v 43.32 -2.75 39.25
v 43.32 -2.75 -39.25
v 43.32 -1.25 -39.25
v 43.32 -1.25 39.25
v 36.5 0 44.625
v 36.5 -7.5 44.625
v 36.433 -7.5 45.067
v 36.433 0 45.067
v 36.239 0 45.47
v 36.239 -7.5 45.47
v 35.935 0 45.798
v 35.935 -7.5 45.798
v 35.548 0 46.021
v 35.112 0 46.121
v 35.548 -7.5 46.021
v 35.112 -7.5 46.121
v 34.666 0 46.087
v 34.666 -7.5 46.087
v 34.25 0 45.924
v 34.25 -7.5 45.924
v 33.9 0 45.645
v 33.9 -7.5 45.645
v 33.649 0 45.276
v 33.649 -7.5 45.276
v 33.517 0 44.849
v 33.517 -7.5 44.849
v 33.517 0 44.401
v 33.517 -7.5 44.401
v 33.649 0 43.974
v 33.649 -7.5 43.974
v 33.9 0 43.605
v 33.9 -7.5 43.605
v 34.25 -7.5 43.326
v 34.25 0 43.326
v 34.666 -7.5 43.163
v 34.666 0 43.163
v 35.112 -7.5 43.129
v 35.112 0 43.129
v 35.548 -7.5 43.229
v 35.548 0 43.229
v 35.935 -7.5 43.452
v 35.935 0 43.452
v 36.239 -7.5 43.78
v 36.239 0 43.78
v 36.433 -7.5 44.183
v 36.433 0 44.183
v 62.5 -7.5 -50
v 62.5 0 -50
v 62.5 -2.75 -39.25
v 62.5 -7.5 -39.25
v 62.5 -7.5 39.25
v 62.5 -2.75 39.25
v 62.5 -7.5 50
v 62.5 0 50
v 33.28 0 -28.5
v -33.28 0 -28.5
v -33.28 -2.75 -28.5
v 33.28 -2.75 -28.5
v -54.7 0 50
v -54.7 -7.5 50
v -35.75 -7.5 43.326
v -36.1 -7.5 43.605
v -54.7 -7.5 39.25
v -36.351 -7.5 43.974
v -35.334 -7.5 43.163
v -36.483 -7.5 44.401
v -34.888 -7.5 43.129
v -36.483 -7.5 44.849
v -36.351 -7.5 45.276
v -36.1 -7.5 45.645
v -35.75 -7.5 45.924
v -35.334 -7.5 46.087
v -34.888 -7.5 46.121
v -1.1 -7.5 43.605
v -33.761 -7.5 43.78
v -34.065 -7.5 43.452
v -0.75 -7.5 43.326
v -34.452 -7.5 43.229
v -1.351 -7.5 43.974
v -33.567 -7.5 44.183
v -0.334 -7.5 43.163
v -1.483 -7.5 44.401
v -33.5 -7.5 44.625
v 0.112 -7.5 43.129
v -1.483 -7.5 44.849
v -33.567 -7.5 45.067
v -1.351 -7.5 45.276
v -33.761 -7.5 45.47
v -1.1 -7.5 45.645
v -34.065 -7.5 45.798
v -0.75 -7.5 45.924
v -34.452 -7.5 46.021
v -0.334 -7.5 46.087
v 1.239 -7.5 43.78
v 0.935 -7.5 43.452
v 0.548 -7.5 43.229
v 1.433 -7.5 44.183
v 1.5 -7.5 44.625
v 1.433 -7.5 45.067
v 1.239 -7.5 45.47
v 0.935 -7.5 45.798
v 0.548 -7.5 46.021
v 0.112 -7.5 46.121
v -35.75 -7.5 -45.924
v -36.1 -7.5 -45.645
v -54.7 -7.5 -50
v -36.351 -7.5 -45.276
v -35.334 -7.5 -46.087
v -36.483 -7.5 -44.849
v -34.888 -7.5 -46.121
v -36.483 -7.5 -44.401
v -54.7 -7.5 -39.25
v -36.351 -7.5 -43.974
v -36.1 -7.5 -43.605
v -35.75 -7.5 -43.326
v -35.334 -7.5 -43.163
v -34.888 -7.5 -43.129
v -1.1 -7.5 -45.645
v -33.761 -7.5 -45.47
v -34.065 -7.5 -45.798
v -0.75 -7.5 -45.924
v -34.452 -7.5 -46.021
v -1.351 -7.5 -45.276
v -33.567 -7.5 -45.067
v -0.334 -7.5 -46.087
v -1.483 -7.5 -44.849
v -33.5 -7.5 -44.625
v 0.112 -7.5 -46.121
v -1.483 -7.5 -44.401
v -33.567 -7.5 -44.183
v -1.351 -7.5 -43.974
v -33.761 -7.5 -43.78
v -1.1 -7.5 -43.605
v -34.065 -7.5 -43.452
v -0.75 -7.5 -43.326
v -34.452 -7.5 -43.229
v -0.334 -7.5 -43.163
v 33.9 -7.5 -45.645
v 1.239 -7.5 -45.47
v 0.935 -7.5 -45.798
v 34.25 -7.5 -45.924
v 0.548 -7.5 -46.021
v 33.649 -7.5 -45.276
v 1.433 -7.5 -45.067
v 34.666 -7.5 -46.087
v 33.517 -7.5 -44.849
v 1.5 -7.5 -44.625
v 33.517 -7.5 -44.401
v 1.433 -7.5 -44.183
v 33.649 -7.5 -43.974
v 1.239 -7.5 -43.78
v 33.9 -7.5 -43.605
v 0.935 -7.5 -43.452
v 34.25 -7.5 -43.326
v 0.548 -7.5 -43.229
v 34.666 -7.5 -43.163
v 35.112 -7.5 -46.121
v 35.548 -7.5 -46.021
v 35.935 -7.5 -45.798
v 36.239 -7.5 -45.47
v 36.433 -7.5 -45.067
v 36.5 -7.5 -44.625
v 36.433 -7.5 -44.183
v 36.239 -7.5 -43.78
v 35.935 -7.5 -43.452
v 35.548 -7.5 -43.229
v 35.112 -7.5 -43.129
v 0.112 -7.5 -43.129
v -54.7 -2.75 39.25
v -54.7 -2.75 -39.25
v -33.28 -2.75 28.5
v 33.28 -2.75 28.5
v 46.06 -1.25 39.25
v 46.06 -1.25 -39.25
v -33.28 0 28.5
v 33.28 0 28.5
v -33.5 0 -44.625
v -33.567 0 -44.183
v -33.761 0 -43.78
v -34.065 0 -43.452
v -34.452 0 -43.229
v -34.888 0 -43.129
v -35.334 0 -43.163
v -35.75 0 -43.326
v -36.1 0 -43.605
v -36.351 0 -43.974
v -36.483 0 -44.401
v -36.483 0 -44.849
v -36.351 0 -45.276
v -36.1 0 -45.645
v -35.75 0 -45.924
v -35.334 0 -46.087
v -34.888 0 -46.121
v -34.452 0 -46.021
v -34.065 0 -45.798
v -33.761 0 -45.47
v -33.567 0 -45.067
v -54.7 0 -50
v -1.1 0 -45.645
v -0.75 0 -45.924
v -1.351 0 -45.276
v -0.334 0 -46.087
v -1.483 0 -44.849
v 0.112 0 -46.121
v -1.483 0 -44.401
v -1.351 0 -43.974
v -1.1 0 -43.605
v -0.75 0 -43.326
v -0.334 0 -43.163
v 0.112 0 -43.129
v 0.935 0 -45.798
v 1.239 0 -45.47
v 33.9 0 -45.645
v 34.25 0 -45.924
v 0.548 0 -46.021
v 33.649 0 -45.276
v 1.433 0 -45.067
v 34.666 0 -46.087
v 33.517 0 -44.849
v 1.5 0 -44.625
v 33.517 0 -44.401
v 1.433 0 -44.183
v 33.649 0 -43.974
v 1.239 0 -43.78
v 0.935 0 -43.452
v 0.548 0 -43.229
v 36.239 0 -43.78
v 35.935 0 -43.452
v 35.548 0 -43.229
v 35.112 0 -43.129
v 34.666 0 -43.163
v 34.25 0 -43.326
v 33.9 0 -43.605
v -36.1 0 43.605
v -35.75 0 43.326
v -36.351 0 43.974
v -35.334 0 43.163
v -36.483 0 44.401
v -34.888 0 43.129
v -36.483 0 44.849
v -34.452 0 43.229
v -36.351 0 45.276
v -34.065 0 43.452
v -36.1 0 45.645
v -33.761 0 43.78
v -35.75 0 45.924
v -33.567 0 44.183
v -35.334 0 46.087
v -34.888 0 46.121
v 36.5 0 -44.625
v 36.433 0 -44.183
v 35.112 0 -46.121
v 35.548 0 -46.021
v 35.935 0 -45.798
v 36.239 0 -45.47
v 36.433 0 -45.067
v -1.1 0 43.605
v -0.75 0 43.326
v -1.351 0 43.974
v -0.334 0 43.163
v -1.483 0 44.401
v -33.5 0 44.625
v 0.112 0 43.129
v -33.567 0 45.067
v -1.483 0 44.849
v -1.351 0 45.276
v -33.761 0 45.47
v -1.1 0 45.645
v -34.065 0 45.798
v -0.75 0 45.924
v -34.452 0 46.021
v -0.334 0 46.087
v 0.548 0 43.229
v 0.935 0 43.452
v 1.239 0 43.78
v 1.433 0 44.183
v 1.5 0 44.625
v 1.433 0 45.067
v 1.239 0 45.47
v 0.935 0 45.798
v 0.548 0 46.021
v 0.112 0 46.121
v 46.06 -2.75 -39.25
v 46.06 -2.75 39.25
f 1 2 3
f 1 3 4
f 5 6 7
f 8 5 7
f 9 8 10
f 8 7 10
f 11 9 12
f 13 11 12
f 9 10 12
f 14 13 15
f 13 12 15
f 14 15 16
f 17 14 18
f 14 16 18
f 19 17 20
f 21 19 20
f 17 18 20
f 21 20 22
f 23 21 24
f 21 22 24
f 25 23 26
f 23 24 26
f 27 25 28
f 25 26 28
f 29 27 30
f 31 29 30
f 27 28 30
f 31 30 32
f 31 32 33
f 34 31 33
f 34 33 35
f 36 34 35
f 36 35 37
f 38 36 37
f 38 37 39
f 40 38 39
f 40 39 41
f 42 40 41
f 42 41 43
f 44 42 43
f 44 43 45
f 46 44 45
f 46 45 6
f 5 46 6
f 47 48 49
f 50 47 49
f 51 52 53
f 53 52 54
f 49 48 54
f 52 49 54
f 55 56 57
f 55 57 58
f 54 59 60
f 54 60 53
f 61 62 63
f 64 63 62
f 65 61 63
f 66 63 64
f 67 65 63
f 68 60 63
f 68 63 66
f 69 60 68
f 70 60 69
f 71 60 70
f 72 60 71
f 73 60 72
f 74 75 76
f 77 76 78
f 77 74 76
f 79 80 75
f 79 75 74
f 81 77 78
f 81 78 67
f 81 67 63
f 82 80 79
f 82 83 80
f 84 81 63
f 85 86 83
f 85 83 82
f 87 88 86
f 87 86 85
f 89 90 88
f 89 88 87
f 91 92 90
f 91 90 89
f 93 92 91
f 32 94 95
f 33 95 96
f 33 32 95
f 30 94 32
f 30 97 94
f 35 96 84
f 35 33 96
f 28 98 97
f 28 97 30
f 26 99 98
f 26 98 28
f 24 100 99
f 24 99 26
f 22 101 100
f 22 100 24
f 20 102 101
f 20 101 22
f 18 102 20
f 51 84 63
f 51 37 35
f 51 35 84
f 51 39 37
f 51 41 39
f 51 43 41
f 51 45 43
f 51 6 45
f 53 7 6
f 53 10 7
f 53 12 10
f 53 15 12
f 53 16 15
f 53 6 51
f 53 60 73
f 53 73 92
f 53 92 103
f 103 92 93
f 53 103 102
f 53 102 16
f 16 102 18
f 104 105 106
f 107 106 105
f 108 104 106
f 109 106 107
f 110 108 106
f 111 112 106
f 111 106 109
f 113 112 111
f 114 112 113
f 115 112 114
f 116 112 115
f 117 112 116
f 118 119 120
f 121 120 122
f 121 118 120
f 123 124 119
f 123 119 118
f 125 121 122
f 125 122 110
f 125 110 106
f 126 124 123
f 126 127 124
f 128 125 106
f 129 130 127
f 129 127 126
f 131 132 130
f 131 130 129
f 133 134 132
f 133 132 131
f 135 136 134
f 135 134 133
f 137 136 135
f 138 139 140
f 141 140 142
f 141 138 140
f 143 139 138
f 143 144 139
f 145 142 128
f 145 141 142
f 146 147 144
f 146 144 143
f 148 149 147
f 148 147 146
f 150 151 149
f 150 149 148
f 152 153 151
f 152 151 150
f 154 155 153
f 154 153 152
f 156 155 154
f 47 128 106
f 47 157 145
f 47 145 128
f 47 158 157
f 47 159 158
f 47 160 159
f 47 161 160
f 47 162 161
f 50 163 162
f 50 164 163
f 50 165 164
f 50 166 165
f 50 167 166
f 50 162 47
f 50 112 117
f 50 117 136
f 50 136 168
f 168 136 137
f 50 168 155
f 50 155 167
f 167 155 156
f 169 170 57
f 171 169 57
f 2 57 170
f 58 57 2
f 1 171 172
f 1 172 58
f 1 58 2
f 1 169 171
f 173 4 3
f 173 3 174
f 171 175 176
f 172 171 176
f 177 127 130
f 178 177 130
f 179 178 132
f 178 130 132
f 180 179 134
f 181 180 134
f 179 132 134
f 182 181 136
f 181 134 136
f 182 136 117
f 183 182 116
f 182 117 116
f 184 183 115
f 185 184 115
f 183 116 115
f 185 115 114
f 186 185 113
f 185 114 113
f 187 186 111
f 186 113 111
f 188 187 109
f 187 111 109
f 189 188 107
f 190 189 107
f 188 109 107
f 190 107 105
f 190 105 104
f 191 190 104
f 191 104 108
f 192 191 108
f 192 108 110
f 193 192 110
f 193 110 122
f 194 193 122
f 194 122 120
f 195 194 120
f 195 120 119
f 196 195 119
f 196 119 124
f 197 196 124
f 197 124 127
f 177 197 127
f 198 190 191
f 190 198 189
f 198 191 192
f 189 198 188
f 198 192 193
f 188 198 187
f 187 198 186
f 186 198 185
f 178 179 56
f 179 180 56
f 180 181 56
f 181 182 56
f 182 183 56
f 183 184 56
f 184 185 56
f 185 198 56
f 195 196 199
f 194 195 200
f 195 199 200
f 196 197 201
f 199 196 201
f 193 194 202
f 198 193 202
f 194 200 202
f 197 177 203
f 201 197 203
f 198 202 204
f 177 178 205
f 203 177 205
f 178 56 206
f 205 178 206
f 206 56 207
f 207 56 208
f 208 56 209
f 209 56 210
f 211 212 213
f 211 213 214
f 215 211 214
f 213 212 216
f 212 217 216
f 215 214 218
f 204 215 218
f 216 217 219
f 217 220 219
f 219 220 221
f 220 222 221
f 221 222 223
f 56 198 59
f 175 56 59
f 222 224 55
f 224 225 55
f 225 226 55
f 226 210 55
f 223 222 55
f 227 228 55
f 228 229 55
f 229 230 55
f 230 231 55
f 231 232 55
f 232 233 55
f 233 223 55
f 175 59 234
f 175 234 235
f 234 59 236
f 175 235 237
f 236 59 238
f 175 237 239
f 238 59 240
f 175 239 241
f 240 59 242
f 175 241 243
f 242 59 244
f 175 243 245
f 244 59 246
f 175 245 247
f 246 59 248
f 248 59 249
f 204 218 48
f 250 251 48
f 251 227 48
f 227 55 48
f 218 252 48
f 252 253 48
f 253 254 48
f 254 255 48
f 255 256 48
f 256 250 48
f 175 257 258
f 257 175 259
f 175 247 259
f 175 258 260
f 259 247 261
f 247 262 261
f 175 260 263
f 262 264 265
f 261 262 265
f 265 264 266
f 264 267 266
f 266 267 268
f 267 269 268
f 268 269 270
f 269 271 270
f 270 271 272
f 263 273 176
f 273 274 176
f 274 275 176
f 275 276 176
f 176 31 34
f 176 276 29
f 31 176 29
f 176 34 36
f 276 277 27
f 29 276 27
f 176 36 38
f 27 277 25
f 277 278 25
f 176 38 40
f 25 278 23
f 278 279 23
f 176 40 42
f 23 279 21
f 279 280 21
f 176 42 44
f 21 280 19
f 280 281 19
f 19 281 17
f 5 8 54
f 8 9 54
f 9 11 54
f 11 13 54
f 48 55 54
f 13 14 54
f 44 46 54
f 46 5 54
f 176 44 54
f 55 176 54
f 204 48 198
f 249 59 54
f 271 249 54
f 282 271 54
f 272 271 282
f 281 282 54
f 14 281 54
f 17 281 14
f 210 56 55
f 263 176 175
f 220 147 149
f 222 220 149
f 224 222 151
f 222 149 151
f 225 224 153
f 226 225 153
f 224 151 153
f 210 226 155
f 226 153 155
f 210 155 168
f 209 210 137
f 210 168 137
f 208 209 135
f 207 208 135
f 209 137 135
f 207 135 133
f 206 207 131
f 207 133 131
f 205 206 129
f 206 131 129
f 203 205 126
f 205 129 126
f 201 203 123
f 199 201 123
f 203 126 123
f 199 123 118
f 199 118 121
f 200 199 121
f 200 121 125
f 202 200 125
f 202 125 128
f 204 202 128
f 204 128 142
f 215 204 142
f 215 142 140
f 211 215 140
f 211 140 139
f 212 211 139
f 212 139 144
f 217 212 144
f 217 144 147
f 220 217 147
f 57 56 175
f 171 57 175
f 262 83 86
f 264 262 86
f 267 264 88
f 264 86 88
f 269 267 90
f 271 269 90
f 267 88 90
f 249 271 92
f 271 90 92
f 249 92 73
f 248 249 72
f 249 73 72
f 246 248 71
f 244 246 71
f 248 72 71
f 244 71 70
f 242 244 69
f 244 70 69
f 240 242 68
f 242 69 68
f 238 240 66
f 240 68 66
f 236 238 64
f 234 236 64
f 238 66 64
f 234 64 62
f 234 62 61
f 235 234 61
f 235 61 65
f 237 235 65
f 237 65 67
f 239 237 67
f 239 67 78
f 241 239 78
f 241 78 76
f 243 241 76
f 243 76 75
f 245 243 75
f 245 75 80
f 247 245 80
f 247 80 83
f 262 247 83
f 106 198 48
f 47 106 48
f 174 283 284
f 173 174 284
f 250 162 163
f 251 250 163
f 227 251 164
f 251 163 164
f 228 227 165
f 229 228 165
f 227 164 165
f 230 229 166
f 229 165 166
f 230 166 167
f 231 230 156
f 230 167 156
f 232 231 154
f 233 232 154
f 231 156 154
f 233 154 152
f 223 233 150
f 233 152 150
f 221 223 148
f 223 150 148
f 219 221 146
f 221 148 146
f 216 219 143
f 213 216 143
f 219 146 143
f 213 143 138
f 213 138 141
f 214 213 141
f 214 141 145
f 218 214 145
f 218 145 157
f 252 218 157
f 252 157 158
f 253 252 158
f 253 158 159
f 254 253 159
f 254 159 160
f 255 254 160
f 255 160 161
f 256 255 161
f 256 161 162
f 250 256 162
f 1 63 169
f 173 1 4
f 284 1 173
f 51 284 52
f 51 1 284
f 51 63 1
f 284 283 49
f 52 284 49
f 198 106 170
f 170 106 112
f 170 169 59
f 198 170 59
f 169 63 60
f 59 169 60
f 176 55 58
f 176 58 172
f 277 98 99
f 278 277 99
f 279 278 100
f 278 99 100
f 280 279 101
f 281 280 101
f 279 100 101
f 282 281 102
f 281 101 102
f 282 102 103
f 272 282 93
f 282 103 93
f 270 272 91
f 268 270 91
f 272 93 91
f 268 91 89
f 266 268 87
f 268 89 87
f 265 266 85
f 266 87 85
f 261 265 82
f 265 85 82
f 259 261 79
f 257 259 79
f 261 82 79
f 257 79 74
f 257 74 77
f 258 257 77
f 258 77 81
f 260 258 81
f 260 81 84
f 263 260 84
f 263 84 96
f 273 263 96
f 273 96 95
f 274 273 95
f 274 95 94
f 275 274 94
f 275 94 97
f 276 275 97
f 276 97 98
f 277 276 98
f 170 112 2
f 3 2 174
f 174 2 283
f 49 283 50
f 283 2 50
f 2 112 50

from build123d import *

# Parameters (mm, degrees)
F0_W      = 125
F0_H      = 100
F0_W_2    = 66.56
F0_H_2    = 57
F1_DEPTH  = 7.5
F2_W      = 174.649224
F2_H      = 78.5
F3_DEPTH  = 4.75
F4_W      = 2.74
F4_H      = 78.5
F5_DEPTH  = 1.5
F6_W      = 7.8
F6_H      = 78.5
F7_DEPTH  = 4.75
F8_W      = 7.8
F8_H      = 100
F9_DEPTH  = 25
F10_R     = 1.5
F11_DEPTH = 25
F12_R     = 1.5
F13_DEPTH = 25


with BuildPart() as f1:
    # F0 (on Front) → F1 (new body)
    with BuildSketch(Plane.XZ):
        Rectangle(F0_W, F0_H)
        Rectangle(F0_W_2, F0_H_2, mode=Mode.SUBTRACT)
    extrude(amount=F1_DEPTH)

    # F2 (on face) → F3 (cut)
    with BuildSketch(Plane.XZ.offset(7.5)):
        Rectangle(F2_W, F2_H)
    extrude(amount=-F3_DEPTH, mode=Mode.SUBTRACT)

    # F4 (on face) → F5 (cut)
    with BuildSketch(Plane.XZ.offset(2.75)):
        with Locations((44.69, 0)):
            Rectangle(F4_W, F4_H)
    extrude(amount=-F5_DEPTH, mode=Mode.SUBTRACT)

    # F6 (on face) → F7 (join)
    with BuildSketch(Plane.XZ.offset(2.75)):
        with Locations((-58.6, 0)):
            Rectangle(F6_W, F6_H)
    extrude(amount=F7_DEPTH)

    # F8 (on face) → F9 (cut)
    with BuildSketch(Plane.XZ.offset(7.5)):
        with Locations((-58.6, 0)):
            Rectangle(F8_W, F8_H)
    extrude(amount=-F9_DEPTH, mode=Mode.SUBTRACT)

    # F10 (on face) → F11 (cut)
    with BuildSketch(Plane.XZ.offset(7.5)):
        with Locations((0, 44.625)):
            Circle(F10_R)
        with Locations((-35, 44.625)):
            Circle(F10_R)
        with Locations((35, 44.625)):
            Circle(F10_R)
    extrude(amount=-F11_DEPTH, mode=Mode.SUBTRACT)

    # F12 (on face) → F13 (cut)
    with BuildSketch(Plane.XZ.offset(7.5)):
        with Locations((0, -44.625)):
            Circle(F12_R)
        with Locations((35, -44.625)):
            Circle(F12_R)
        with Locations((-35, -44.625)):
            Circle(F12_R)
    extrude(amount=-F13_DEPTH, mode=Mode.SUBTRACT)


solid = f1.part
